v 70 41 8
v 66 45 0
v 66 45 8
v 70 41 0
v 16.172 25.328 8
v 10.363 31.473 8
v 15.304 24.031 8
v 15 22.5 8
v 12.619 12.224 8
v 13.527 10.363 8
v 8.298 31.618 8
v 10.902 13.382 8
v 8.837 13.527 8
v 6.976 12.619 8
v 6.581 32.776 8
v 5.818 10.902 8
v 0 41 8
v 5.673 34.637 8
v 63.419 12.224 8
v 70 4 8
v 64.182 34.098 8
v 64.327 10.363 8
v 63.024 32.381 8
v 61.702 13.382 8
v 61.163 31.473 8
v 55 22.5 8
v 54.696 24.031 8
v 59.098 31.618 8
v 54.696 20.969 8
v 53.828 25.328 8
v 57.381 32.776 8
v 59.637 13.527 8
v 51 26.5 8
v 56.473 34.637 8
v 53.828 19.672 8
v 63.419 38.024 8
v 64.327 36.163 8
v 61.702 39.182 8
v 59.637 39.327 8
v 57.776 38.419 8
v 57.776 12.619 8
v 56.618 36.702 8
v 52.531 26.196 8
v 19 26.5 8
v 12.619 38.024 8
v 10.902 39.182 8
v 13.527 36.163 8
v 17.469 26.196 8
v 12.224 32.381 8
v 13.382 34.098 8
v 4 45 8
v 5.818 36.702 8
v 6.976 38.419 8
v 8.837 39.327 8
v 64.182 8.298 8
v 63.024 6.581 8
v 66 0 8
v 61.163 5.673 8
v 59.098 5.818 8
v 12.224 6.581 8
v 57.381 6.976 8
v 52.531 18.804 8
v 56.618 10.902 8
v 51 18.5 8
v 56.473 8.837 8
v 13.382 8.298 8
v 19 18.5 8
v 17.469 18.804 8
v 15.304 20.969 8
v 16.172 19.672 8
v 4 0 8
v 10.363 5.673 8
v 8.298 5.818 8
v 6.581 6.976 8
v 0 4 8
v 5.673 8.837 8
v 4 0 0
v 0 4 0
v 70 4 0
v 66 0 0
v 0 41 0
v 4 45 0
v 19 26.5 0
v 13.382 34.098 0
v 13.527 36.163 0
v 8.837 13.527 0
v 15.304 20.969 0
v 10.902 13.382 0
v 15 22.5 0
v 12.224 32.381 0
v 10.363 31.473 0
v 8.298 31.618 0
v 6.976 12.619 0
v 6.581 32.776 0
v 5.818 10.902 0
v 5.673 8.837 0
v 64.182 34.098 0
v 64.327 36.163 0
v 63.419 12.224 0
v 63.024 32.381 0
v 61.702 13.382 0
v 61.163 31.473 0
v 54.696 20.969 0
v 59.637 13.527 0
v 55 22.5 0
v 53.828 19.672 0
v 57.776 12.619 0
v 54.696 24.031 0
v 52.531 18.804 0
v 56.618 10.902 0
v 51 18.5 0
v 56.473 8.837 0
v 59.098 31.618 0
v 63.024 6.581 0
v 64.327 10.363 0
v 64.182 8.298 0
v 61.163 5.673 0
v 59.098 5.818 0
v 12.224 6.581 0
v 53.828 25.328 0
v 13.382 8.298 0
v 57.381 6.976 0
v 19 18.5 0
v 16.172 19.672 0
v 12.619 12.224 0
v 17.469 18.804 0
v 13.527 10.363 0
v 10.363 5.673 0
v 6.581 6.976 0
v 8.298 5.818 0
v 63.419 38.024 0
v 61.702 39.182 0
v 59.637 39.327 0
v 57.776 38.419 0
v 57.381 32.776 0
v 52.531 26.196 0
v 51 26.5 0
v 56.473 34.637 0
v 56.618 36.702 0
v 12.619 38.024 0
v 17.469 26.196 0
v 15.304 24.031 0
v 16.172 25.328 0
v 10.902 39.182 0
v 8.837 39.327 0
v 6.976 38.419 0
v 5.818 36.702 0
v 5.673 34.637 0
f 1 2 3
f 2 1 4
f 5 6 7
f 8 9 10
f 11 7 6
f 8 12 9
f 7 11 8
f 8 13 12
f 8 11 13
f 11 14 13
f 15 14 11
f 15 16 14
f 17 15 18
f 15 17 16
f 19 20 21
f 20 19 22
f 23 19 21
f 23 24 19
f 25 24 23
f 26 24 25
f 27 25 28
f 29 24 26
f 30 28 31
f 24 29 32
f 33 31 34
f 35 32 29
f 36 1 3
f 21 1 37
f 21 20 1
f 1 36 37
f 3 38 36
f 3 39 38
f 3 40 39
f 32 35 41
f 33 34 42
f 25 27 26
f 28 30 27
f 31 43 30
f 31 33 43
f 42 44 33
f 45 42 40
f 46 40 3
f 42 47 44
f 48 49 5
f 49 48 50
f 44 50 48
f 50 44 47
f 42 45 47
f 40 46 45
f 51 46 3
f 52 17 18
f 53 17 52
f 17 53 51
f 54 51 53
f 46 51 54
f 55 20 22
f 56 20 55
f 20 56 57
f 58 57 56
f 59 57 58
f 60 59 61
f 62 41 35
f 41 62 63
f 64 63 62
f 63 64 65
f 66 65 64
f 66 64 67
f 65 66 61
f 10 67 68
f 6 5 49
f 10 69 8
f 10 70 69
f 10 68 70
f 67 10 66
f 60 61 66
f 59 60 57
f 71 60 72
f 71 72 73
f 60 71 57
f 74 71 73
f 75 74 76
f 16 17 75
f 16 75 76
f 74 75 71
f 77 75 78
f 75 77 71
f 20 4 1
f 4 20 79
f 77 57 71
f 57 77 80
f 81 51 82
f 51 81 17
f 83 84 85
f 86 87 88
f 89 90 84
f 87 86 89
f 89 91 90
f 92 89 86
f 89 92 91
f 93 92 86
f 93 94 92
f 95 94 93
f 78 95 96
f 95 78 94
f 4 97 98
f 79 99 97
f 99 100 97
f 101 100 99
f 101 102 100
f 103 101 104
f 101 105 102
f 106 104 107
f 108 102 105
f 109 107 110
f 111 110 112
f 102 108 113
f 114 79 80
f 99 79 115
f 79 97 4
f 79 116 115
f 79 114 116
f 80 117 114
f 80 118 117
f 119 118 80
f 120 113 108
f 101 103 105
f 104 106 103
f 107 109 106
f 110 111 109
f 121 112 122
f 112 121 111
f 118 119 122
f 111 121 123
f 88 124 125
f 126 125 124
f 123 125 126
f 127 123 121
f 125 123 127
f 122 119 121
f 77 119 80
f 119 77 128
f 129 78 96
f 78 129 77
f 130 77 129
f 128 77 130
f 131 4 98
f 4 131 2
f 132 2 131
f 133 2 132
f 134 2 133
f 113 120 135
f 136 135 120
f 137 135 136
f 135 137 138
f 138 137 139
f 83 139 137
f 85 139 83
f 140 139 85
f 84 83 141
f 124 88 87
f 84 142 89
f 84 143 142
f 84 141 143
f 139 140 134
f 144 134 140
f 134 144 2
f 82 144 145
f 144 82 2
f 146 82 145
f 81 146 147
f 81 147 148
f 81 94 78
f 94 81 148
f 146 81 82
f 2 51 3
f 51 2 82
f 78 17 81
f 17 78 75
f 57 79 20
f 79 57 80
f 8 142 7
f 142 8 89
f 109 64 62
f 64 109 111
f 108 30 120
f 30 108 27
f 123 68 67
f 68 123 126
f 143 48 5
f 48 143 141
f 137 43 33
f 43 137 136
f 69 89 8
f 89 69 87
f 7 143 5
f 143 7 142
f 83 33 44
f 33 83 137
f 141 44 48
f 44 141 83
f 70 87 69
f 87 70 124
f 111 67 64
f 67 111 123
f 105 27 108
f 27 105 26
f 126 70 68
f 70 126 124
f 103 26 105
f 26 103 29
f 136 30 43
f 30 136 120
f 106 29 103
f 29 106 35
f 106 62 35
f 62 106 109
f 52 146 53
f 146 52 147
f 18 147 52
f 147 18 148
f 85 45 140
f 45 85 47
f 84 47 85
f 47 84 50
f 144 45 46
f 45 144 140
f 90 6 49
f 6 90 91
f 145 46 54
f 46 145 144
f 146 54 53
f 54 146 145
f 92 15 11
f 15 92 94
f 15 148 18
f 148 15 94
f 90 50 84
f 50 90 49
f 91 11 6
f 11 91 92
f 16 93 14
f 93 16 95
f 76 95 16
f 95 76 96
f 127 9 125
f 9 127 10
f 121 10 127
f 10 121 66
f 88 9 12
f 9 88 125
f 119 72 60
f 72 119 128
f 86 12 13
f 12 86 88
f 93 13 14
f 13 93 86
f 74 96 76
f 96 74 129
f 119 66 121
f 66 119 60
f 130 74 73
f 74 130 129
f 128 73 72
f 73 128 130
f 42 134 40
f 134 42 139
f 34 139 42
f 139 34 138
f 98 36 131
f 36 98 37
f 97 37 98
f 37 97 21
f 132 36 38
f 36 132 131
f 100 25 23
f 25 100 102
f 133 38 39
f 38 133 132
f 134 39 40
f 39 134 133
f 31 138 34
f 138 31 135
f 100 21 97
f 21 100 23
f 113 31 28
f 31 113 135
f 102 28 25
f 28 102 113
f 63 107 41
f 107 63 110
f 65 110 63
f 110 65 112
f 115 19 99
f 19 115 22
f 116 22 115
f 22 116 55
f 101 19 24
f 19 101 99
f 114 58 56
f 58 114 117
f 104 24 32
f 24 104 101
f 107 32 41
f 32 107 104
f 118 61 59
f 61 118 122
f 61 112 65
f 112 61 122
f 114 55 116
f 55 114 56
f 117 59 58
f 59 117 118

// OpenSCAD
$fn = 32;

// ----------------------------------------------------------------------
// Bracket plate: slot plate 70 x 45
// ----------------------------------------------------------------------

// --- parameters (mm) ---
hole_r = 4;               // bolt hole radius
plate_t = 8;              // plate thickness, Z (extrusion height)
plate_l = 70;             // plate length
plate_w = 45;             // plate width
slot_l = 32;              // slot straight length
slot_r = 4;               // slot end radius

slot_len = slot_l + 2 * slot_r;
slot_w = 2 * slot_r;
hole_d2 = 2 * hole_r;

profile = [[4, 0], [66, 0], [70, 4], [70, 41], [66, 45], [4, 45], [0, 41], [0, 4]];  // primary outline, 8 points, counter clockwise
void_1 = [[51, 18.5], [52.531, 18.804], [53.828, 19.672], [54.696, 20.969], [55, 22.5], [54.696, 24.031], [53.828, 25.328], [52.531, 26.196], [51, 26.5], [19, 26.5], [17.469, 26.196], [16.172, 25.328], [15.304, 24.031], [15, 22.5], [15.304, 20.969], [16.172, 19.672], [17.469, 18.804], [19, 18.5]];  // grip slot, 18 points
void_2 = [[13.527, 36.163], [12.619, 38.024], [10.902, 39.182], [8.837, 39.327], [6.976, 38.419], [5.818, 36.702], [5.673, 34.637], [6.581, 32.776], [8.298, 31.618], [10.363, 31.473], [12.224, 32.381], [13.382, 34.098]];  // corner hole, 12 points
void_3 = [[13.527, 10.363], [12.619, 12.224], [10.902, 13.382], [8.837, 13.527], [6.976, 12.619], [5.818, 10.902], [5.673, 8.837], [6.581, 6.976], [8.298, 5.818], [10.363, 5.673], [12.224, 6.581], [13.382, 8.298]];  // corner hole, 12 points
void_4 = [[64.327, 36.163], [63.419, 38.024], [61.702, 39.182], [59.637, 39.327], [57.776, 38.419], [56.618, 36.702], [56.473, 34.637], [57.381, 32.776], [59.098, 31.618], [61.163, 31.473], [63.024, 32.381], [64.182, 34.098]];  // corner hole, 12 points
void_5 = [[64.327, 10.363], [63.419, 12.224], [61.702, 13.382], [59.637, 13.527], [57.776, 12.619], [56.618, 10.902], [56.473, 8.837], [57.381, 6.976], [59.098, 5.818], [61.163, 5.673], [63.024, 6.581], [64.182, 8.298]];  // corner hole, 12 points

// --- the one profile operation ---
difference() {
  linear_extrude(height = plate_t) polygon(points = profile);
  translate([0, 0, -1])
    linear_extrude(height = plate_t + 2) polygon(points = void_1);
  translate([0, 0, -1])
    linear_extrude(height = plate_t + 2) polygon(points = void_2);
  translate([0, 0, -1])
    linear_extrude(height = plate_t + 2) polygon(points = void_3);
  translate([0, 0, -1])
    linear_extrude(height = plate_t + 2) polygon(points = void_4);
  translate([0, 0, -1])
    linear_extrude(height = plate_t + 2) polygon(points = void_5);
}
